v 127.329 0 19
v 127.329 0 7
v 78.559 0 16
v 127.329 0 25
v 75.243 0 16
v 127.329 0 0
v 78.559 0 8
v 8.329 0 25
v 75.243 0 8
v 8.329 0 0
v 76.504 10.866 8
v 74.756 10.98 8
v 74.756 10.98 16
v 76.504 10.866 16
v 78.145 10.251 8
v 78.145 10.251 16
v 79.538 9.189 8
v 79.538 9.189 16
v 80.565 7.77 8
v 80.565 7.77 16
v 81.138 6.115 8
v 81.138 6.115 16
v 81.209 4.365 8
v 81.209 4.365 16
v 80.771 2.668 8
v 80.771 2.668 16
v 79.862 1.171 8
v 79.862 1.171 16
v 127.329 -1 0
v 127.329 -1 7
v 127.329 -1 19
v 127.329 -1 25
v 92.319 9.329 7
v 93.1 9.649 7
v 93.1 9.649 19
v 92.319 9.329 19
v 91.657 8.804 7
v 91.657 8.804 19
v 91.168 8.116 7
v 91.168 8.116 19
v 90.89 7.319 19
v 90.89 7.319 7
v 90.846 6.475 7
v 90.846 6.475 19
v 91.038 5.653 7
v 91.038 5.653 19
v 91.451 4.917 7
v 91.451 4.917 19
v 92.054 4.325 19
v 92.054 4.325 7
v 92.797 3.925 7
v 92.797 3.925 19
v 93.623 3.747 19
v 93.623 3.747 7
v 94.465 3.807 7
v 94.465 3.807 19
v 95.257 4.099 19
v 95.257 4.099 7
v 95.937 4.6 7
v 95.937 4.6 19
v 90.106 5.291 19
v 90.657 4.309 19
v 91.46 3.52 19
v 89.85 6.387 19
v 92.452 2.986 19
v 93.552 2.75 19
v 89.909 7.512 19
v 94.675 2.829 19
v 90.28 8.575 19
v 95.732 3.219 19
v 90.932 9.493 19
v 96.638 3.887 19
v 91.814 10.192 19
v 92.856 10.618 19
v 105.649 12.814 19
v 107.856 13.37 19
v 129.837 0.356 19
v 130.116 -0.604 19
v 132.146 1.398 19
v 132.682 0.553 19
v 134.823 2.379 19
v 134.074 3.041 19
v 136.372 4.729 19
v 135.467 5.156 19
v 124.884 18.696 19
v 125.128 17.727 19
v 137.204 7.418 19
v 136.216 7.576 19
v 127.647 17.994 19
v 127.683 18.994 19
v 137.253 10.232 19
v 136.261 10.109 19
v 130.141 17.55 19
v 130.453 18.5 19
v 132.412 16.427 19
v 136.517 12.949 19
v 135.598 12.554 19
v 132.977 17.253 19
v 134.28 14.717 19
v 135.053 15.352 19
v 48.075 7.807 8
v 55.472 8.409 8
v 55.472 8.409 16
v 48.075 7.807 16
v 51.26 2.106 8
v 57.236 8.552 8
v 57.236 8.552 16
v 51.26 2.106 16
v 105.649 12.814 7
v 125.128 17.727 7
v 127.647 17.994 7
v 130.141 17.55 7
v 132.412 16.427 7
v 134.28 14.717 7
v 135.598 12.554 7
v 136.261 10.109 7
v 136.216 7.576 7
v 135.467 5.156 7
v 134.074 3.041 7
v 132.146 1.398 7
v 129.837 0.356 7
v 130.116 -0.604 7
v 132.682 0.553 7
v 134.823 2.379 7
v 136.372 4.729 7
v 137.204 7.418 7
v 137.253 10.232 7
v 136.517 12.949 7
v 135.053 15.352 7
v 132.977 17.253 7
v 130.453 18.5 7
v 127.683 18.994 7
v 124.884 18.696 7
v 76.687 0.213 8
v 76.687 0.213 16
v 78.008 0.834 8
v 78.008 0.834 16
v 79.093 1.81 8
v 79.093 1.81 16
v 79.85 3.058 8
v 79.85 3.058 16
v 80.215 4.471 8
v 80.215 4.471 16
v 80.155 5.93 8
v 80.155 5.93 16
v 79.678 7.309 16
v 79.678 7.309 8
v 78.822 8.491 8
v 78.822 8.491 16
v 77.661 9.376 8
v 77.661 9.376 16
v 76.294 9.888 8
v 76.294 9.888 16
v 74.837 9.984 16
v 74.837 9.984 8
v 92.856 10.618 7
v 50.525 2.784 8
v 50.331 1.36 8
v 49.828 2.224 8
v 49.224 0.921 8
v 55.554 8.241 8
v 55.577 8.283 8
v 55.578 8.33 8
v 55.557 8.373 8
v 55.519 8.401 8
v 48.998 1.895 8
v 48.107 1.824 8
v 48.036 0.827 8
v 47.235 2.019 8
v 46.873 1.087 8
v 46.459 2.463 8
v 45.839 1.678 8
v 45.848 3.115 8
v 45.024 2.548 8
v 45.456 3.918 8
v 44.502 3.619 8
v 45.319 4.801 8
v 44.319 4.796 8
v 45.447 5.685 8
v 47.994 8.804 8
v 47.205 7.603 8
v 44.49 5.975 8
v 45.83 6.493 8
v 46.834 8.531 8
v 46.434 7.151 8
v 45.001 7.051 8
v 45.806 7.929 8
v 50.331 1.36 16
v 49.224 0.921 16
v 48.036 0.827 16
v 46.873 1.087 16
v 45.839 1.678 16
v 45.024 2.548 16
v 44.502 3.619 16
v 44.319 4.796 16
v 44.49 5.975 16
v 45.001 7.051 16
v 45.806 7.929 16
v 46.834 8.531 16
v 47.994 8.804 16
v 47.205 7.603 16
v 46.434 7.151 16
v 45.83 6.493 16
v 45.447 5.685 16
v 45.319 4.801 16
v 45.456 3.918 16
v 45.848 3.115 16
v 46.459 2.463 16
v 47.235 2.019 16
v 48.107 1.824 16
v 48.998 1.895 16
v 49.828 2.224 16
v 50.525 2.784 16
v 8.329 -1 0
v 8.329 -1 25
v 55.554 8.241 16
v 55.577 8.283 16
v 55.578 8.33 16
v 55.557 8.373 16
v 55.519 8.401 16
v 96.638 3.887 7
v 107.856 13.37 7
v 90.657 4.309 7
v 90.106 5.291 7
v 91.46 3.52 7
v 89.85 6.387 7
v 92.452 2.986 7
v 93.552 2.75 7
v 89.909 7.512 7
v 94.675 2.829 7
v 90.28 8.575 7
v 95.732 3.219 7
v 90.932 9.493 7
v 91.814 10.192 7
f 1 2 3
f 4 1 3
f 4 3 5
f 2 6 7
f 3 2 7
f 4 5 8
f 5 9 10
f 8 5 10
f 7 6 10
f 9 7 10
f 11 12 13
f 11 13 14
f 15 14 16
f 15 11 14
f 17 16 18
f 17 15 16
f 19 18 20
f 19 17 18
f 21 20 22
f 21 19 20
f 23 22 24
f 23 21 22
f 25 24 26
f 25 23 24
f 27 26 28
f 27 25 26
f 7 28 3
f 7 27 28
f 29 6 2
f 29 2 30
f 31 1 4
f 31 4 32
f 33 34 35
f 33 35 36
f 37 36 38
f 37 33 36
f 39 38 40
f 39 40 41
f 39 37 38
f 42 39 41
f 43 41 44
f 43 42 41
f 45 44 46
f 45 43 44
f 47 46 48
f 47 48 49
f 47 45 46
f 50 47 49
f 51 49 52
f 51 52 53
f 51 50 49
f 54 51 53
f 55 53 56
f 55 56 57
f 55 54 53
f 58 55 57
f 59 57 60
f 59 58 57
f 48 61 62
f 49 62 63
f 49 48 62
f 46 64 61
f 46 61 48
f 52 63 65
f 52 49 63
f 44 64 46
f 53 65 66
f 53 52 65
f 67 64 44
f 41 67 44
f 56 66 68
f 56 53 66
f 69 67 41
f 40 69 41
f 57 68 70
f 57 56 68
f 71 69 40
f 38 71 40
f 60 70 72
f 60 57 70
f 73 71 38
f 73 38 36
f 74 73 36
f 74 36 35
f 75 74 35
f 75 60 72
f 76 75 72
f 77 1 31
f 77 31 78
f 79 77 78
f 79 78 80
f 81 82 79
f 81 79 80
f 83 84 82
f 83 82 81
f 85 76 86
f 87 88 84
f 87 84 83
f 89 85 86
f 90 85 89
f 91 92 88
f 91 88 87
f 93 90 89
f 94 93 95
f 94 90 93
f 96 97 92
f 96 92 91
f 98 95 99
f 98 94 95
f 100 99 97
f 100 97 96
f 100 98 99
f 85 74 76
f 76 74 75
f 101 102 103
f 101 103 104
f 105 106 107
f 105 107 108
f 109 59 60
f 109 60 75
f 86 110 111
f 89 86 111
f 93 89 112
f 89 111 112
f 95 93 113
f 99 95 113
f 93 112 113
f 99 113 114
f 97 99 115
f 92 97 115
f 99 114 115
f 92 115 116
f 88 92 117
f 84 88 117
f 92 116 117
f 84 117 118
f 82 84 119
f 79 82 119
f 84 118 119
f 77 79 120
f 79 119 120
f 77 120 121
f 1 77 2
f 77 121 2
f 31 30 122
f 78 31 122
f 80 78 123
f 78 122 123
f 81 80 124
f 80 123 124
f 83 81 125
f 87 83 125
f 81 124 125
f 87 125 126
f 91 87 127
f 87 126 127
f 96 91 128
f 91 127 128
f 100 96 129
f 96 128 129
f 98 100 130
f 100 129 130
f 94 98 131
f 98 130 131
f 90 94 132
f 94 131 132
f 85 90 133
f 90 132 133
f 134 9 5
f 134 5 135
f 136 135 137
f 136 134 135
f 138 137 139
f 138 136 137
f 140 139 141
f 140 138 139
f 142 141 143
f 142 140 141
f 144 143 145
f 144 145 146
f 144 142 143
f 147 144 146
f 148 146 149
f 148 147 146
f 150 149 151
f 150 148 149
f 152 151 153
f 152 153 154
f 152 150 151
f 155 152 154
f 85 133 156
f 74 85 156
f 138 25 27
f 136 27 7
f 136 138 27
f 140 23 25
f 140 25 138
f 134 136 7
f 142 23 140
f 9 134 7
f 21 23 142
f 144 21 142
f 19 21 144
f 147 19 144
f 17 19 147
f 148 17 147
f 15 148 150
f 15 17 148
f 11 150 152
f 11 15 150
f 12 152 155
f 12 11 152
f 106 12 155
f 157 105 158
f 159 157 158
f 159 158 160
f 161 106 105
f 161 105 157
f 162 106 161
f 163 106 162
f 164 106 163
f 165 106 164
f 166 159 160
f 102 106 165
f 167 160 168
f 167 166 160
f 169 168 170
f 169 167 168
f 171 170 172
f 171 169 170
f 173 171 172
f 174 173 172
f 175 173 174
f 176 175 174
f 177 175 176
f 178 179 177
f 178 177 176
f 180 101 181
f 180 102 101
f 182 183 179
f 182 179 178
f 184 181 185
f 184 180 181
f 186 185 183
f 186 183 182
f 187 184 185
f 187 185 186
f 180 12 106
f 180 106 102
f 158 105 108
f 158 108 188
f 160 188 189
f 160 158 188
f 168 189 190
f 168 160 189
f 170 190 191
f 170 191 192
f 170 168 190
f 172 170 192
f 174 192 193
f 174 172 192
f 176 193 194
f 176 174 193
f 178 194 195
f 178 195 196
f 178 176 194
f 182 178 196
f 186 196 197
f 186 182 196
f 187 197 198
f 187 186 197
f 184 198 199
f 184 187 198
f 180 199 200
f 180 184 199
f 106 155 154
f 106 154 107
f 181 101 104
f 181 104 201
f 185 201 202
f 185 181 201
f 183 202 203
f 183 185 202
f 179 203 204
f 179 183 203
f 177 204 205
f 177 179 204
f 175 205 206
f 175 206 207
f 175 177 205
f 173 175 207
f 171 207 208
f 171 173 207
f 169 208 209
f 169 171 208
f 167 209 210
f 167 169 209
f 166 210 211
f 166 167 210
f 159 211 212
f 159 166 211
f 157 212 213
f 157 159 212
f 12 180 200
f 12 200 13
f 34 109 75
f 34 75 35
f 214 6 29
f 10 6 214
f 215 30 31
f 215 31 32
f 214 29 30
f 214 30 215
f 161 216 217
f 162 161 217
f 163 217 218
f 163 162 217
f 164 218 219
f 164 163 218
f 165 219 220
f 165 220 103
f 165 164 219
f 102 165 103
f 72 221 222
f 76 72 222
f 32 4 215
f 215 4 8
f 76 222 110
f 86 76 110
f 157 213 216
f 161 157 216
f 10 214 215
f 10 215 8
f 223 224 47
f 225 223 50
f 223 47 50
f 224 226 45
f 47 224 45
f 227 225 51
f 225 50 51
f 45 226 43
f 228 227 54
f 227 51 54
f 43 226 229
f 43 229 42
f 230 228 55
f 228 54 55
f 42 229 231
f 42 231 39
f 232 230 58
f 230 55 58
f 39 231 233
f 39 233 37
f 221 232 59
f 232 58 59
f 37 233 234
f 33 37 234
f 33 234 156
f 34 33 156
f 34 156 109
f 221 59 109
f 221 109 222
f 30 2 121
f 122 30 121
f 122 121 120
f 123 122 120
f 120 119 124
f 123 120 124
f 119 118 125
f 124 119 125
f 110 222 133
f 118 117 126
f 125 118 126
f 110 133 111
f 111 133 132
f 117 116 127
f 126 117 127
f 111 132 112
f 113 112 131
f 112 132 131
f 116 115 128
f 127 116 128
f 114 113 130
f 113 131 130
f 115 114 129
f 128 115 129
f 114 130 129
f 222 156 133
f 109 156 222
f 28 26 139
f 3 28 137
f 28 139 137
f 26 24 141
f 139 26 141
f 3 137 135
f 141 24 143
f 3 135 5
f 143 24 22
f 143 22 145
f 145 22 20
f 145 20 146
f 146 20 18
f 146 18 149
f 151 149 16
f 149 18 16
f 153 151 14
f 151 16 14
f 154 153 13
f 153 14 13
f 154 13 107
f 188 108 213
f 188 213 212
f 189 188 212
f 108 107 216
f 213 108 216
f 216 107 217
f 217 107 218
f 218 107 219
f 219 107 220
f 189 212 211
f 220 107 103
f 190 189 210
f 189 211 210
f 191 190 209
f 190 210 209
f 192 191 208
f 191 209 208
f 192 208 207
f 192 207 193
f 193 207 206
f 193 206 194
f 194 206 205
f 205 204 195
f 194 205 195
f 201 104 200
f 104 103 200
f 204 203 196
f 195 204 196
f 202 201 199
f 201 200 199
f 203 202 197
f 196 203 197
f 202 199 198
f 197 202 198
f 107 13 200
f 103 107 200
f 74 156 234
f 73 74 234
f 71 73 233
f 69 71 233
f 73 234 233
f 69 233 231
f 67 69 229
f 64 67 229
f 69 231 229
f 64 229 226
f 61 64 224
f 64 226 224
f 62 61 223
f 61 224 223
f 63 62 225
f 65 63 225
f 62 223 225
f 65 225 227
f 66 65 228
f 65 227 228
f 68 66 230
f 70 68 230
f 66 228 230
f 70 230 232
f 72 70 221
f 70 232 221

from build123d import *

# Parameters (mm, degrees)
BOSS_EXTRUDE1_START = 8
BOSS_EXTRUDE1_DEPTH = 8
BOSS_EXTRUDE2_START = 7
BOSS_EXTRUDE2_DEPTH = 12
BOSS_EXTRUDE3_DEPTH = 25


with BuildPart() as part:
    # Sketch1 → Boss-Extrude1 (new body)
    with BuildSketch(Plane.XY.offset(BOSS_EXTRUDE1_START)):
        with BuildLine():
            ThreePointArc((74.83730752, 9.983544534), (80.238511438, 5.202826688), (75.242626998, 0))
            Line((75.242626998, 0), (78.559251789, 0))
            ThreePointArc((78.559251789, 0), (80.9122, 6.963655259), (74.756243624, 10.980253441))
            Line((74.756243624, 10.980253441), (47.994339706, 8.803665899))
            ThreePointArc((47.994339706, 8.803665899), (44.723252789, 3.063686722), (51.260118774, 2.106214182))
            Line((51.260118774, 2.106214182), (57.235944241, 8.551998103))
            Line((57.235944241, 8.551998103), (74.83730752, 9.983544534))
        make_face()
        with BuildLine():
            Line((55.553573418, 8.241091684), (50.524737903, 2.783868204))
            ThreePointArc((50.524737903, 2.783868204), (45.622088414, 3.501972609), (48.075403602, 7.806956992))
            Line((48.075403602, 7.806956992), (55.471928941, 8.408527977))
            ThreePointArc((55.471928941, 8.408527977), (55.569918893, 8.352685675), (55.553573418, 8.241091684))
        make_face(mode=Mode.SUBTRACT)
    extrude(amount=BOSS_EXTRUDE1_DEPTH)



with BuildPart() as body_2:
    # Sketch1<5> → Boss-Extrude2 (new body)
    with BuildSketch(Plane.XY.offset(BOSS_EXTRUDE2_START)):
        with BuildLine():
            Line((127.329435135, 0), (127.329435135, -1))
            ThreePointArc((127.329435135, -1), (137.253233755, 10.232161094), (124.883891422, 18.696355808))
            Line((124.883891422, 18.696355808), (92.855908874, 10.61849306))
            ThreePointArc((92.855908874, 10.61849306), (90.346819157, 4.780693613), (96.637825713, 3.88701016))
            Line((96.637825713, 3.88701016), (107.85561912, 13.370294626))
            Line((107.85561912, 13.370294626), (125.128445793, 17.726720227))
            ThreePointArc((125.128445793, 17.726720227), (136.260853893, 10.108944985), (127.329435135, 0))
        make_face()
        with BuildLine():
            Line((105.648911717, 12.813735076), (95.936900874, 4.600245304))
            ThreePointArc((95.936900874, 4.600245304), (91.218645958, 5.270507894), (93.100463246, 9.648857479))
            Line((93.100463246, 9.648857479), (105.648911717, 12.813735076))
        make_face(mode=Mode.SUBTRACT)
    extrude(amount=BOSS_EXTRUDE2_DEPTH)


with BuildPart() as part_1:
    add(part.part)

    add(body_2.part)  # Boss-Extrude3 merges body 2
    # Sketch1<6> → Boss-Extrude3 (add)
    with BuildSketch(Plane.XY):
        Polygon((75.242626998, 0), (8.329435135, 0), (8.329435135, -1), (127.329435135, -1), (127.329435135, 0), (78.559251789, 0), align=None)
    extrude(amount=BOSS_EXTRUDE3_DEPTH)


solid = part_1.part
